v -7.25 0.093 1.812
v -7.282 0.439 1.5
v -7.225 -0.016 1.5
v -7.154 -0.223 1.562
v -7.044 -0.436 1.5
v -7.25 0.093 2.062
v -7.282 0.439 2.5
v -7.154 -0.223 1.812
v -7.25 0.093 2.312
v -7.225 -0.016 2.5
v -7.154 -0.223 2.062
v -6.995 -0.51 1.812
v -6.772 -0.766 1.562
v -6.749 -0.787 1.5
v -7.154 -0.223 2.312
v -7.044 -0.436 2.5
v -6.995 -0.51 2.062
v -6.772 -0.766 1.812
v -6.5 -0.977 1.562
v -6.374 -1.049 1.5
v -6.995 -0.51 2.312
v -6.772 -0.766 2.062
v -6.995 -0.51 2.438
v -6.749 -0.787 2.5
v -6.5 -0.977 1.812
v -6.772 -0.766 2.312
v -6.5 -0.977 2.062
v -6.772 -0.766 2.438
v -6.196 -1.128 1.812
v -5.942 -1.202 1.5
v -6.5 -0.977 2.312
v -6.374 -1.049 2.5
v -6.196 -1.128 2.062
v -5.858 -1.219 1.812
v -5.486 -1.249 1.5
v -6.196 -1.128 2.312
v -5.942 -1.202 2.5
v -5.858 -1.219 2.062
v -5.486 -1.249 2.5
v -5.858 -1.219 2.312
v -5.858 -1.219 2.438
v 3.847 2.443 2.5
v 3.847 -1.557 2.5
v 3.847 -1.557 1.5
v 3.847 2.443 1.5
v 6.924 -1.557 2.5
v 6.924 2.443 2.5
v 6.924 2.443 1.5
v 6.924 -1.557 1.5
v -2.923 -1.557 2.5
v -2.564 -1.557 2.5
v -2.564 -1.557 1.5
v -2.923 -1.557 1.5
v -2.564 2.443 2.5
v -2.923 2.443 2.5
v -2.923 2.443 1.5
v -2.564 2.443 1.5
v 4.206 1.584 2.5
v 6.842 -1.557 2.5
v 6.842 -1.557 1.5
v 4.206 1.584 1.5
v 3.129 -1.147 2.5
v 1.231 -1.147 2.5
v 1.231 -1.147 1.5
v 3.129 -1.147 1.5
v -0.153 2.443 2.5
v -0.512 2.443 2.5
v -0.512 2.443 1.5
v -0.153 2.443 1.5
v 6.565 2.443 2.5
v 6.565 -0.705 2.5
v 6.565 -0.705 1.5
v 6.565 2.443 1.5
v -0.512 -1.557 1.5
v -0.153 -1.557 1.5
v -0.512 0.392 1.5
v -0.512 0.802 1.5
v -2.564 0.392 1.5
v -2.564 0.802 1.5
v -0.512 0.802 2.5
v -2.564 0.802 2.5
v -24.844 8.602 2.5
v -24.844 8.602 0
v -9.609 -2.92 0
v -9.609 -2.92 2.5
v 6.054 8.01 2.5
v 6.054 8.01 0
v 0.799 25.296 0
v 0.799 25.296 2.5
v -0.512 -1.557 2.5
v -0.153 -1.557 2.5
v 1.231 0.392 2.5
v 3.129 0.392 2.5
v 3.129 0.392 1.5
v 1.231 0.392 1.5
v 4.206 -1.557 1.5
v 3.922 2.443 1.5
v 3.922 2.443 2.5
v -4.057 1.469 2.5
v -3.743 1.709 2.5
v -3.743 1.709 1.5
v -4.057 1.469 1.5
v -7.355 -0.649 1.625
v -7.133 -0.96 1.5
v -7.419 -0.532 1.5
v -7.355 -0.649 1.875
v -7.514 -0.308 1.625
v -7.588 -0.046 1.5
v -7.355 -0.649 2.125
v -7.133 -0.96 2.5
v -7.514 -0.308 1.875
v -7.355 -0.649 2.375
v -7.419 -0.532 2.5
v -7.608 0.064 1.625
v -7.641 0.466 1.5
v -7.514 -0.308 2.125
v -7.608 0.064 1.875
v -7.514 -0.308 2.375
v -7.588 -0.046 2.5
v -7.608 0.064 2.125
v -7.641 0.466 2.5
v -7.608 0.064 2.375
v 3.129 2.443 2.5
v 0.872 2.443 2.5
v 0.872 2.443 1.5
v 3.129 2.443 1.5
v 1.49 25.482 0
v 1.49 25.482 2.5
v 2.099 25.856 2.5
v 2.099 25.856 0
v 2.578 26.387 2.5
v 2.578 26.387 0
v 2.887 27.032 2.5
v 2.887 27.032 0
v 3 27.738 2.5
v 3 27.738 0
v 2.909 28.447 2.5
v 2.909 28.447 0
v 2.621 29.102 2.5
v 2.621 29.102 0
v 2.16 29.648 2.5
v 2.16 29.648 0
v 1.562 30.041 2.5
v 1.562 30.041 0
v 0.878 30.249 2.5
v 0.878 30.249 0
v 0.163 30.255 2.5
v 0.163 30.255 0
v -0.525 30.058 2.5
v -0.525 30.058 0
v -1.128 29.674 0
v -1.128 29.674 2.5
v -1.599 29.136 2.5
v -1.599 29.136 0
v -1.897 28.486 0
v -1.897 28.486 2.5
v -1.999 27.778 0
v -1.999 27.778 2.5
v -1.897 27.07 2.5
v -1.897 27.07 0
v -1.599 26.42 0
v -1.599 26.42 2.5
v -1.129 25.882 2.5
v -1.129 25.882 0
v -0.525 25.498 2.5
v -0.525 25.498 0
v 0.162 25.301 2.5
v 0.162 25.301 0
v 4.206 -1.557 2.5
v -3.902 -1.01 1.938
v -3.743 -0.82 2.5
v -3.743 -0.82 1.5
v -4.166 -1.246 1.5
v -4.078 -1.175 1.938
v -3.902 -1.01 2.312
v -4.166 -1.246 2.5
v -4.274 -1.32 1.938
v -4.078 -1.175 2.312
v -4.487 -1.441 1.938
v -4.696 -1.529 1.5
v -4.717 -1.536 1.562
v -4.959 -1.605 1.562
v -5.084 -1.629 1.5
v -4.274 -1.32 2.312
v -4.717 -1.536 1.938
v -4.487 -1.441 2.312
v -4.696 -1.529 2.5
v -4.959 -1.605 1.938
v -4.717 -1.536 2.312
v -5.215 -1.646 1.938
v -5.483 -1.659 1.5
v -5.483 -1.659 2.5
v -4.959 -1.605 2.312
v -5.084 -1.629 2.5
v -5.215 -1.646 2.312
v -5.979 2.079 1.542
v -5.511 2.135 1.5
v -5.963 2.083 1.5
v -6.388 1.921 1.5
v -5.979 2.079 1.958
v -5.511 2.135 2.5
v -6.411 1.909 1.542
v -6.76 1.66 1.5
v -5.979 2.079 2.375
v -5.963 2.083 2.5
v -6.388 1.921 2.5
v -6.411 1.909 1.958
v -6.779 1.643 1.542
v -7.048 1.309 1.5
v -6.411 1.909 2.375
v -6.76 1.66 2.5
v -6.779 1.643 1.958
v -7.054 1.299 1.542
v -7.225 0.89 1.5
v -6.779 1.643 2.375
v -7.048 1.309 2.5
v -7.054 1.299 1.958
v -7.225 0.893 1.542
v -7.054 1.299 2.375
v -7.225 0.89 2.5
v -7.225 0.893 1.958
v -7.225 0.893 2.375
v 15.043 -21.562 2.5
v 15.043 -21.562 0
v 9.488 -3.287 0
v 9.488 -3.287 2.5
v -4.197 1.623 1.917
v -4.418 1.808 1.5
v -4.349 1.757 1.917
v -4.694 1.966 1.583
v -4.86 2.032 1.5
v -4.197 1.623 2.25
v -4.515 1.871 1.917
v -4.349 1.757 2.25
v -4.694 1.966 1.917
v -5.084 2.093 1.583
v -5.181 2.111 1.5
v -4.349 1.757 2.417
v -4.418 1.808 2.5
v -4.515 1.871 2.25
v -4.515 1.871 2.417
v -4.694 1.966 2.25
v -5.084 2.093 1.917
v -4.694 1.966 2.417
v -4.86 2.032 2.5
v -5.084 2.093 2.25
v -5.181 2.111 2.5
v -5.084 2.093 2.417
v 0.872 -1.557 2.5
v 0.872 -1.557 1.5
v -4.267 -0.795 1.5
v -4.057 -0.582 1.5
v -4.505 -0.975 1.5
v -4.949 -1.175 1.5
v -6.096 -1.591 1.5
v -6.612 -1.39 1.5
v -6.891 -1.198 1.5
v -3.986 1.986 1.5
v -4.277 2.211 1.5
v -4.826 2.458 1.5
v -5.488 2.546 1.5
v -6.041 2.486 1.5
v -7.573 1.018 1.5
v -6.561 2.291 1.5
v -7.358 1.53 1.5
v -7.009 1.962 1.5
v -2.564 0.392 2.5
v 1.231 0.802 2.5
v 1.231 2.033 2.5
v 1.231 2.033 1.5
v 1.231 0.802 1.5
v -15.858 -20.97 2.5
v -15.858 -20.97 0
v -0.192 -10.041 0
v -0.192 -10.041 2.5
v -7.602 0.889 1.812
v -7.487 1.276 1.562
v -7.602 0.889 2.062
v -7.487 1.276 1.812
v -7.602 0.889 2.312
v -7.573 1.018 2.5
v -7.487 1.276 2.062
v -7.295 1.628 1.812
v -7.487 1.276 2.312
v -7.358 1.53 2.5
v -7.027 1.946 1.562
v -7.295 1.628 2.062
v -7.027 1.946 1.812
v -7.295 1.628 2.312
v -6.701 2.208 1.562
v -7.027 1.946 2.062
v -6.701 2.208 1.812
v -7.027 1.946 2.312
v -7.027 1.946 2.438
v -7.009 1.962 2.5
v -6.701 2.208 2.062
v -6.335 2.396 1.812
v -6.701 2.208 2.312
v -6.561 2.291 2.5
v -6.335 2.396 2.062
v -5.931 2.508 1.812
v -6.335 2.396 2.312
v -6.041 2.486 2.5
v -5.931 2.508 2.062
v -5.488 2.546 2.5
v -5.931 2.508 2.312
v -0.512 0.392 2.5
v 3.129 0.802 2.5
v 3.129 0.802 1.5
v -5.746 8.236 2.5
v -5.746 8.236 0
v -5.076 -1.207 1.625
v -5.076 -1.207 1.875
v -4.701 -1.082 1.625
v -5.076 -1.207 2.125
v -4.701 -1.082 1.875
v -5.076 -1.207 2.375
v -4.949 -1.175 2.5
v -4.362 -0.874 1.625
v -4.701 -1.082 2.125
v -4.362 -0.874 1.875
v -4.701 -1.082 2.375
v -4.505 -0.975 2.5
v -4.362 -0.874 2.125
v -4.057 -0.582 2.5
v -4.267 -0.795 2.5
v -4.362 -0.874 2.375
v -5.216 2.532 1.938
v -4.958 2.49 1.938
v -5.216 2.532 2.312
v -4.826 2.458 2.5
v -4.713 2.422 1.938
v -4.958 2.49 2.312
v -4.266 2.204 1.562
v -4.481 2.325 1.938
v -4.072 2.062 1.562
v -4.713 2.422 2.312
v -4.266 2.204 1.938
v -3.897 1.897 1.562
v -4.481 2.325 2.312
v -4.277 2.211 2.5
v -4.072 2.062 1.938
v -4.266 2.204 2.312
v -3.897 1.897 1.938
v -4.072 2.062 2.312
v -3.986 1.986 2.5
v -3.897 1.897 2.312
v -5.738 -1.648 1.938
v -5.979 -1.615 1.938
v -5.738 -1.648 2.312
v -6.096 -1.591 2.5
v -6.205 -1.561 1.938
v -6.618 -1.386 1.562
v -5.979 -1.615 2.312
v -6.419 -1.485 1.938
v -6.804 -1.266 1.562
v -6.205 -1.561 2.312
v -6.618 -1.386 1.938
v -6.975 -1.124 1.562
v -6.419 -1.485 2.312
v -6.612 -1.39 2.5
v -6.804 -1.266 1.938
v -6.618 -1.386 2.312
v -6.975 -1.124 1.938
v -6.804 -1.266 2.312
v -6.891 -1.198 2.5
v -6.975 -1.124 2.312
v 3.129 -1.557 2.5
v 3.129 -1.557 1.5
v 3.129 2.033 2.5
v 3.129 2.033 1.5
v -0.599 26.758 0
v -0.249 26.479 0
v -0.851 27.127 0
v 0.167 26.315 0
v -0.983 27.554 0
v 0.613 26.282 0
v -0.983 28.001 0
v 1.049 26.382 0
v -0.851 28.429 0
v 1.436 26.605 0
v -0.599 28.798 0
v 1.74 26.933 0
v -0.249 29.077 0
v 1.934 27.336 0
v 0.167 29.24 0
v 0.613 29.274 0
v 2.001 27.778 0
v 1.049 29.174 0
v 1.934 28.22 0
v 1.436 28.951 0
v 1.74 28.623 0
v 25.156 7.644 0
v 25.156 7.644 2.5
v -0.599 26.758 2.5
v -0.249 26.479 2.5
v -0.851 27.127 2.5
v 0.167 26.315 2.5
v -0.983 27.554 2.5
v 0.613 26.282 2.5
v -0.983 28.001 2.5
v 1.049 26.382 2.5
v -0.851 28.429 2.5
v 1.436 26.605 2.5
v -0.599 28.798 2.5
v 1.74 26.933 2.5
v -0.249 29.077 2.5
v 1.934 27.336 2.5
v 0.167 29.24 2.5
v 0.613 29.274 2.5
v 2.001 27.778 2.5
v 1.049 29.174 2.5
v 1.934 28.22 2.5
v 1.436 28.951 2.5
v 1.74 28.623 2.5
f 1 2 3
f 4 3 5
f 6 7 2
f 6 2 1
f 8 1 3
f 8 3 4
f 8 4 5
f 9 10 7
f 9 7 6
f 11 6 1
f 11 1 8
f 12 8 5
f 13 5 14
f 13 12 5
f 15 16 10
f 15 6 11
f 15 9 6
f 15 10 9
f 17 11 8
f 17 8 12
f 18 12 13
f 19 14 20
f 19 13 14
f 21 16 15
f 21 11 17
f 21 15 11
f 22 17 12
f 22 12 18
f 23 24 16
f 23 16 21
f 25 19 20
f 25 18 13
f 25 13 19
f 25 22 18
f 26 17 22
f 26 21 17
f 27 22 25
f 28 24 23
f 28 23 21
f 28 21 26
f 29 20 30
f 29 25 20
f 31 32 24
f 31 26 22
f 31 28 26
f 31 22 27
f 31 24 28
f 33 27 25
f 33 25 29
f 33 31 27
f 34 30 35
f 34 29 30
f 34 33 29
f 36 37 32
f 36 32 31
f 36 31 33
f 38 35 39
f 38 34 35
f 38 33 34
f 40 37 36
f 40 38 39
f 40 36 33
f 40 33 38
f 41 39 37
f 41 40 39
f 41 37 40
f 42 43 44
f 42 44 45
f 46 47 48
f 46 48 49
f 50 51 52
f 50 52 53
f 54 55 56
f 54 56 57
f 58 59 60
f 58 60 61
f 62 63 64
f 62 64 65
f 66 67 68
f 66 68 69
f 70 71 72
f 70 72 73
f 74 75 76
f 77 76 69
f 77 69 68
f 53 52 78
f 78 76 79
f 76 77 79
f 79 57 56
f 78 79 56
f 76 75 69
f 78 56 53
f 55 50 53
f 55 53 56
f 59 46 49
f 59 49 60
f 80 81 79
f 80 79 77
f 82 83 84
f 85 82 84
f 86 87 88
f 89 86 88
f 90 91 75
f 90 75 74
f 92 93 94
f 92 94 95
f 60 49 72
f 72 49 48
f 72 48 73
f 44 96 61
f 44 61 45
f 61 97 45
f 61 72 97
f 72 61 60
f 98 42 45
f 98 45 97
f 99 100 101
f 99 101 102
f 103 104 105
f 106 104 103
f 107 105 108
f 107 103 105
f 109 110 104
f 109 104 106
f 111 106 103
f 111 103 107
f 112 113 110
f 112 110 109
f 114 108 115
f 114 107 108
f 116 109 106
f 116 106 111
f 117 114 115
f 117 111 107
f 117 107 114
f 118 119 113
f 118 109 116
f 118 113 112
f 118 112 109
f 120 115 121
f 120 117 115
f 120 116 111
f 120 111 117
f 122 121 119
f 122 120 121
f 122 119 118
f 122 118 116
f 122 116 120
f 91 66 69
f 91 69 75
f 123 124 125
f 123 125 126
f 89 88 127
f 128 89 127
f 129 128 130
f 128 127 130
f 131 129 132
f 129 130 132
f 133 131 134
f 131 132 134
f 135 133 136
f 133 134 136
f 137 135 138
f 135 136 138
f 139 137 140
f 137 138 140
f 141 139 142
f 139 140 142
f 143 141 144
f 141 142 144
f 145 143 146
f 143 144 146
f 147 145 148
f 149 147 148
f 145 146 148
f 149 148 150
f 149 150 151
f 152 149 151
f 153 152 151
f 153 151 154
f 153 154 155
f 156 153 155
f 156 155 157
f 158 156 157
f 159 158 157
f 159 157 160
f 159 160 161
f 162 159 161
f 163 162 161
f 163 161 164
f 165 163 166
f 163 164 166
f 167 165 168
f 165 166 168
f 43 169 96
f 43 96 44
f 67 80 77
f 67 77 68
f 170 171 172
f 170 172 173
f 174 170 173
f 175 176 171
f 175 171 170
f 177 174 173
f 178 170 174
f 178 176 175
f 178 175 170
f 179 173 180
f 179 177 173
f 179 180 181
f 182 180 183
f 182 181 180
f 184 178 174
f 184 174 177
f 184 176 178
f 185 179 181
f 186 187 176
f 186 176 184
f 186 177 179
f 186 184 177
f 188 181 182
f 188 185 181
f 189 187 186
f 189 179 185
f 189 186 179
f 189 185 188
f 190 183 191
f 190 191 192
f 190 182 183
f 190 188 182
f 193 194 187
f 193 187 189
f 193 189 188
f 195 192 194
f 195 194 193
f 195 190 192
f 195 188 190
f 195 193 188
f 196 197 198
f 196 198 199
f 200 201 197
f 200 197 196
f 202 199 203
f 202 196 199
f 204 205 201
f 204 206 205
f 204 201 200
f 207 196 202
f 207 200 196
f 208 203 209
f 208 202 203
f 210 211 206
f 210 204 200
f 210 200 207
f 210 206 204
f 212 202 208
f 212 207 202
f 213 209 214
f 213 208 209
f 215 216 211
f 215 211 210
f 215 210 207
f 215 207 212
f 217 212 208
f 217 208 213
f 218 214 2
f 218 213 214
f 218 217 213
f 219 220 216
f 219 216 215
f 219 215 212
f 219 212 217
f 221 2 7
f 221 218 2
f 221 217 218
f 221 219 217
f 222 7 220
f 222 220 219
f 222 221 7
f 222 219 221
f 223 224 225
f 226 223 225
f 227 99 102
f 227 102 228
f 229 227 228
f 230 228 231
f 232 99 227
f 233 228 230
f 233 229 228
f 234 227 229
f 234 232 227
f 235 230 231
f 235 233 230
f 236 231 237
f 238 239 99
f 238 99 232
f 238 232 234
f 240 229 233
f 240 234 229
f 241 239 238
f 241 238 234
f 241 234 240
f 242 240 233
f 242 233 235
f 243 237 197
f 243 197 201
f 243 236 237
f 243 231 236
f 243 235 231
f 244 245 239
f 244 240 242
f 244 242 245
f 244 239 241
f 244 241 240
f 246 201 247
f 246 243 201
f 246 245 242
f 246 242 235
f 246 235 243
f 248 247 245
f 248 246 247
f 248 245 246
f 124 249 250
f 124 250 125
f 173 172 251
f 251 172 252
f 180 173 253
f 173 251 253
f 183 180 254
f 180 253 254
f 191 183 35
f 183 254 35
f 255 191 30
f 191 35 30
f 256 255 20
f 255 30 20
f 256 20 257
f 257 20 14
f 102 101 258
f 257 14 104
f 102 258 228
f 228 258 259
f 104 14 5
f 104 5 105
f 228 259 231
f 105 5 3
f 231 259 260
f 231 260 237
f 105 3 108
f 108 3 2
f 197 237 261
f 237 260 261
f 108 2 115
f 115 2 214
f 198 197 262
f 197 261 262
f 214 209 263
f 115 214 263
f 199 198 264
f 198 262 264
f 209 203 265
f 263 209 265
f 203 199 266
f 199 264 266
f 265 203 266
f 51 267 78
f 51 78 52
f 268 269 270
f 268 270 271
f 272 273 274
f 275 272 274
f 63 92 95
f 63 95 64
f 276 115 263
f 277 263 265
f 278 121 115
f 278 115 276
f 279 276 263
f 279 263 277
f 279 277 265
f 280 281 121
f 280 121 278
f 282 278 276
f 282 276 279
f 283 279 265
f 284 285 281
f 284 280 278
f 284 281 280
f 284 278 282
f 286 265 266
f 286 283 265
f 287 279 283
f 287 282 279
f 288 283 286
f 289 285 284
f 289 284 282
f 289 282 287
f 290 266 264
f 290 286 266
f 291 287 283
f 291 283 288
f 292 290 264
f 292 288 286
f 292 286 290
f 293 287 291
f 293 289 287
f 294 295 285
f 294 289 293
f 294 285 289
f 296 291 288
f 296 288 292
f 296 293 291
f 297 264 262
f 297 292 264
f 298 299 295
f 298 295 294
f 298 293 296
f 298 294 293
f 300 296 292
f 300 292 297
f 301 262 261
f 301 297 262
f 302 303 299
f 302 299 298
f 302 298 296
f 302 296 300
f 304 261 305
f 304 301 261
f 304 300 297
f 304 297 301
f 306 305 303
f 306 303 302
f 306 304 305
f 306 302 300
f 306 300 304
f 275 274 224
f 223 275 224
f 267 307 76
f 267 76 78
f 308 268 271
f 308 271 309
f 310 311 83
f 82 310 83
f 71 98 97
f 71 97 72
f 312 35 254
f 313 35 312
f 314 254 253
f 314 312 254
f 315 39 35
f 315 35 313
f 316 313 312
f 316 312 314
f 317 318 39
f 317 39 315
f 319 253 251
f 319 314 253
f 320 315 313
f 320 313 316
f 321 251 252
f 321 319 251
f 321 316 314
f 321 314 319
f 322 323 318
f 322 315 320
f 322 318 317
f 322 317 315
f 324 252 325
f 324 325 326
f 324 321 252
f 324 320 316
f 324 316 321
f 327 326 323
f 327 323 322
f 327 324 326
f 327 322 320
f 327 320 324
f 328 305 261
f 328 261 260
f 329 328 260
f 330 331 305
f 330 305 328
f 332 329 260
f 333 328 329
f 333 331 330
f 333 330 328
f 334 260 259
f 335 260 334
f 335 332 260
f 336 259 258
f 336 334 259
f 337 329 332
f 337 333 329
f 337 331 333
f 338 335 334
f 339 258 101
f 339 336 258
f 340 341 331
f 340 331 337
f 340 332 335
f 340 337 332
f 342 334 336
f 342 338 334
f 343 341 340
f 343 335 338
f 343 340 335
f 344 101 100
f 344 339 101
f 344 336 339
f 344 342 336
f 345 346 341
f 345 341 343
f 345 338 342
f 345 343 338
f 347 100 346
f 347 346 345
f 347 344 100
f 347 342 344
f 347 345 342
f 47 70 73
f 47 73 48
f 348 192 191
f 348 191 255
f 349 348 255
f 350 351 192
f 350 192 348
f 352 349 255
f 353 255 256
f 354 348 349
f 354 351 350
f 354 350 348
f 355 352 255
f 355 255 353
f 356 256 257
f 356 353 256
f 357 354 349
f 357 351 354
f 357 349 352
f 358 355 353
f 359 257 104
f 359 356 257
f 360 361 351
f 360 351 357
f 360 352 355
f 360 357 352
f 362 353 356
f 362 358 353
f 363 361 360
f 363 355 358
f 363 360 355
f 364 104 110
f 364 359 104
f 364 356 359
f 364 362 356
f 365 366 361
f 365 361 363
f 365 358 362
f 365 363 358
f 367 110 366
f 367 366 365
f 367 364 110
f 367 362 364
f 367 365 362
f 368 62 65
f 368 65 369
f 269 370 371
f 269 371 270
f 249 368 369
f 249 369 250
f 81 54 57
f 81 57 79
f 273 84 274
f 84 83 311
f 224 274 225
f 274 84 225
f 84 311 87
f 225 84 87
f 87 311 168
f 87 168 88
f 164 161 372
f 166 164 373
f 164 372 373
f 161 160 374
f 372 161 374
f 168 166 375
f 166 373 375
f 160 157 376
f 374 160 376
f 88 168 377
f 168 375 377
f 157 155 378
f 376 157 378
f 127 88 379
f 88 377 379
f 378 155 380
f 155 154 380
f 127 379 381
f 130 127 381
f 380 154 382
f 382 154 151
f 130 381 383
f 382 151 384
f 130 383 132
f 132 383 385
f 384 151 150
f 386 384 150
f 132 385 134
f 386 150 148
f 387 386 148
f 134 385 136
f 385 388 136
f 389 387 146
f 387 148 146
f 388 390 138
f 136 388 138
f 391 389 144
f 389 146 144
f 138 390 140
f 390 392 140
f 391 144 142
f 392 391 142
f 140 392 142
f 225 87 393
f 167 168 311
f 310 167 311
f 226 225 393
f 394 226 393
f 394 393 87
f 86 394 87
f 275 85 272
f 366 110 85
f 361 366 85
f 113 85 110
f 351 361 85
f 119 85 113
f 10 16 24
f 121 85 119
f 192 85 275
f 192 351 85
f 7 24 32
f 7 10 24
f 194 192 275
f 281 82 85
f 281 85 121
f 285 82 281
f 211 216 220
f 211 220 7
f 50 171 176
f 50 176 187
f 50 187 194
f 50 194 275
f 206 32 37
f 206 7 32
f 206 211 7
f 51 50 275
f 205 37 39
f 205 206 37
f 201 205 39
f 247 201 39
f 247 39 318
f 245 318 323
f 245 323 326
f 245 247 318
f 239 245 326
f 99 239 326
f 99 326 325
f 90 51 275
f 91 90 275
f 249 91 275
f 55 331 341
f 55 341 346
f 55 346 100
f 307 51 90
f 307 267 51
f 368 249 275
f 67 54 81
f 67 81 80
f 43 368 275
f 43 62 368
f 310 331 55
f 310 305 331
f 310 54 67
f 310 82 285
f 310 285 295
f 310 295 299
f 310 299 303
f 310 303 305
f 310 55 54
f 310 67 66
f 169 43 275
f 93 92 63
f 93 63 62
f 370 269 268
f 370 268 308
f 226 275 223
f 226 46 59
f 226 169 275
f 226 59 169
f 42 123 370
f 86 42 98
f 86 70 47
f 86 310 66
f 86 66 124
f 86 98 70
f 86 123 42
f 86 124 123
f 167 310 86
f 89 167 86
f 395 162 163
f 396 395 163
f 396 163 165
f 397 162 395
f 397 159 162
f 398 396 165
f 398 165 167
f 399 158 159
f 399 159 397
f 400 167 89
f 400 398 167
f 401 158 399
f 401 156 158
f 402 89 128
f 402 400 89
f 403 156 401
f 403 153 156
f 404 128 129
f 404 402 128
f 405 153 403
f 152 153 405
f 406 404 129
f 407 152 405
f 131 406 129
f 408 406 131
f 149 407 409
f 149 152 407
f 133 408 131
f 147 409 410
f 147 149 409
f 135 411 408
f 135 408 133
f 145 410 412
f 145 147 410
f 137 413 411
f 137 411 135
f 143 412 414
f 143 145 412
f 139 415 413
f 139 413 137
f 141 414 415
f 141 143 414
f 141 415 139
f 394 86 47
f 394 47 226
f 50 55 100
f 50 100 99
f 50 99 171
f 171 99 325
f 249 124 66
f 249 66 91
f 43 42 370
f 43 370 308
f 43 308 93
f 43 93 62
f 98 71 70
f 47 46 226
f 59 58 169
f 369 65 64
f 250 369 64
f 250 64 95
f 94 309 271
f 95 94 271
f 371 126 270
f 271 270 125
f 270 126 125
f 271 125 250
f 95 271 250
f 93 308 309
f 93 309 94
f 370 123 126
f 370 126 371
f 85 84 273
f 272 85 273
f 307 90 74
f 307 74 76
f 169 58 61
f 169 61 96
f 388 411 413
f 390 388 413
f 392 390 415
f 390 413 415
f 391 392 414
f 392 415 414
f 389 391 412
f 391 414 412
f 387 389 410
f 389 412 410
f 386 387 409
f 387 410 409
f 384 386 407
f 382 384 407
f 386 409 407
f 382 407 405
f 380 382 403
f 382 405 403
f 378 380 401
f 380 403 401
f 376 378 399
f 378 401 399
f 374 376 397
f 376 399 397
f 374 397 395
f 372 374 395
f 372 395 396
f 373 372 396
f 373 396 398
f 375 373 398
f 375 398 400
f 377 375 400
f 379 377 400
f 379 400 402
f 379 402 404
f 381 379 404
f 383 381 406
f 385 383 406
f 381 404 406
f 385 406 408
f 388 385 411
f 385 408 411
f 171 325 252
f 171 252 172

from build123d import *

# Parameters (mm, degrees)
EXTRUDE_1_DEPTH     = 2.5
CUT_EXTRUDE_1_DEPTH = 1
SKETCH_4_R          = 1.5
CUT_EXTRUDE_3_DEPTH = 2.5


with BuildPart() as part:
    # 草图1 → 凸台-拉伸1 (new body)
    with BuildSketch(Plane.XY):
        with BuildLine():
            Line((-24.844384519, 8.60192761), (-9.608590106, -2.919770039))
            Line((-9.608590106, -2.919770039), (-15.858256337, -20.970271974))
            Line((-15.858256337, -20.970271974), (-0.192351313, -10.040570794))
            Line((-0.192351313, -10.040570794), (15.0434431, -21.562268443))
            Line((15.0434431, -21.562268443), (9.487934055, -3.286883328))
            Line((9.487934055, -3.286883328), (25.155615481, 7.644057202))
            Line((25.155615481, 7.644057202), (6.053810642, 8.009998274))
            Line((6.053810642, 8.009998274), (0.799130777, 25.295776665))
            ThreePointArc((0.799130777, 25.295776665), (0.520604646, 30.277806022), (0.162308714, 25.300877517))
            Line((0.162308714, 25.300877517), (-5.746083956, 8.236053671))
            Line((-5.746083956, 8.236053671), (-24.844384519, 8.60192761))
        make_face()
    extrude(amount=EXTRUDE_1_DEPTH)

    # 草图2 → 切除-拉伸1 (cut)
    with BuildSketch(Plane.XY.offset(2.5)):
        with BuildLine():
            Line((-3.743094252, 1.70920022), (-4.057196816, 1.468815604))
            add(Edge.make_bspline(
                [(-4.057196816, 1.468815604), (-4.079603546, 1.49551957), (-4.124114914, 1.548567474), (-4.195725431, 1.623058382), (-4.27035588, 1.692847252), (-4.347977733, 1.758266543), (-4.429988155, 1.817028561), (-4.514400496, 1.872195536), (-4.602626834, 1.921644379), (-4.724628816, 1.981602077), (-4.884226357, 2.044169112), (-5.085134745, 2.096629947), (-5.294861714, 2.130025577), (-5.437944685, 2.133642538), (-5.510722457, 2.135482271)],
                knots=[0, 0, 0, 0, 0.757959112, 1.505699292, 2.245454638, 2.979532153, 3.711538275, 4.438200793, 5.171680507, 5.909471876, 7.393775596, 8.890124382, 10.418191784, 12, 12, 12, 12], degree=3))
            add(Edge.make_bspline(
                [(-5.510722457, 2.135482271), (-5.550817657, 2.1350206), (-5.630635934, 2.134101541), (-5.749091332, 2.121976827), (-5.865334819, 2.104935444), (-5.979290781, 2.07964936), (-6.090814162, 2.047680653), (-6.20063405, 2.00948018), (-6.30716045, 1.962217506), (-6.411867008, 1.909979494), (-6.512186106, 1.8509767), (-6.60710616, 1.786618584), (-6.696280981, 1.717625331), (-6.779781109, 1.643738352), (-6.857691907, 1.565290397), (-6.929448834, 1.481445435), (-6.994803588, 1.392471523), (-7.055051617, 1.299541914), (-7.109009027, 1.202927295), (-7.154186032, 1.102270072), (-7.194191886, 0.999293954), (-7.225848163, 0.892835485), (-7.250904753, 0.783643752), (-7.268193512, 0.671425709), (-7.280180336, 0.556415789), (-7.281094824, 0.478462289), (-7.281555791, 0.439168169)],
                knots=[0, 0, 0, 0, 1.054917814, 2.100044995, 3.131103042, 4.146048494, 5.169673617, 6.183595914, 7.203665975, 8.234915748, 9.262203917, 10.264457458, 11.251630812, 12.227803204, 13.197192746, 14.159520551, 15.12972552, 16.100847026, 17.073214652, 18.039054194, 19.002613845, 19.979014051, 20.95965708, 21.949030935, 22.966165397, 24, 24, 24, 24], degree=3))
            add(Edge.make_bspline(
                [(-7.281555791, 0.439168169), (-7.280113712, 0.38004666), (-7.277282381, 0.26396942), (-7.252084285, 0.093945865), (-7.213792752, -0.068934905), (-7.156403521, -0.223654725), (-7.085638892, -0.372121419), (-6.996221051, -0.511822966), (-6.892659294, -0.644870468), (-6.773488528, -0.768119552), (-6.642739024, -0.880706666), (-6.502455697, -0.979850188), (-6.352987939, -1.062495768), (-6.195986076, -1.131268278), (-6.030241946, -1.18413311), (-5.856053601, -1.221349251), (-5.673799892, -1.245626029), (-5.549263435, -1.247950244), (-5.485882714, -1.249133114)],
                knots=[0, 0, 0, 0, 1.029171465, 2.020641659, 2.987623507, 3.938342917, 4.889210282, 5.84687017, 6.821220943, 7.821438502, 8.827599549, 9.822697543, 10.807740252, 11.797342354, 12.80366471, 13.83203677, 14.896651826, 16, 16, 16, 16], degree=3))
            add(Edge.make_bspline(
                [(-5.485882714, -1.249133114), (-5.416051069, -1.24720308), (-5.278605688, -1.243404311), (-5.077042229, -1.211222312), (-4.884087068, -1.159041834), (-4.699729826, -1.086015637), (-4.524490231, -0.99108388), (-4.358094048, -0.876000591), (-4.200400824, -0.739671068), (-4.105576502, -0.635576065), (-4.057196816, -0.582466447)],
                knots=[0, 0, 0, 0, 1.028121516, 2.023589091, 2.998037872, 3.967518031, 4.937445131, 5.927275754, 6.942489185, 8, 8, 8, 8], degree=3))
            Line((-4.057196816, -0.582466447), (-3.743094252, -0.820447216))
            add(Edge.make_bspline(
                [(-3.743094252, -0.820447216), (-3.768372092, -0.85306259), (-3.818806692, -0.918137111), (-3.900472998, -1.009876208), (-3.986504195, -1.096166534), (-4.077539292, -1.176312387), (-4.172531054, -1.251917491), (-4.273185125, -1.320833869), (-4.378178305, -1.384023451), (-4.487154852, -1.441882794), (-4.599998981, -1.49321679), (-4.716575478, -1.537163953), (-4.83638185, -1.57502097), (-4.959423574, -1.606166041), (-5.085955868, -1.630475851), (-5.215522124, -1.646726908), (-5.348401981, -1.657860524), (-5.438049319, -1.658875285), (-5.483478868, -1.659389524)],
                knots=[0, 0, 0, 0, 0.986787822, 1.968848986, 2.935600012, 3.899624008, 4.868462664, 5.837806735, 6.815139263, 7.798259679, 8.787526145, 9.778297419, 10.776456485, 11.791383307, 12.812564526, 13.85620153, 14.913611965, 16, 16, 16, 16], degree=3))
            add(Edge.make_bspline(
                [(-5.483478868, -1.659389524), (-5.526500201, -1.659090104), (-5.611569562, -1.658498038), (-5.737168135, -1.648906989), (-5.859441941, -1.635821576), (-5.978041514, -1.616118569), (-6.093614057, -1.592867894), (-6.205111868, -1.561700744), (-6.313632108, -1.526787411), (-6.418738783, -1.48575314), (-6.520521297, -1.439448931), (-6.618651367, -1.387115721), (-6.713083861, -1.32919359), (-6.8047472, -1.266959293), (-6.892287295, -1.198413805), (-6.976462753, -1.12450908), (-7.057745583, -1.04549421), (-7.108034366, -0.988517235), (-7.133318611, -0.959870293)],
                knots=[0, 0, 0, 0, 1.114604814, 2.203992996, 3.262667896, 4.300477797, 5.318619304, 6.316056647, 7.298880507, 8.271930387, 9.238335007, 10.195173496, 11.151986948, 12.108099108, 13.064862484, 14.031167946, 15.010108607, 16, 16, 16, 16], degree=3))
            add(Edge.make_bspline(
                [(-7.133318611, -0.959870293), (-7.17381649, -0.910108934), (-7.25432332, -0.81118698), (-7.357324101, -0.650860144), (-7.445492736, -0.483467905), (-7.516779503, -0.308130844), (-7.57250834, -0.125242401), (-7.61111542, 0.065289615), (-7.636202968, 0.263287264), (-7.63907187, 0.397957879), (-7.64053015, 0.466411758)],
                knots=[0, 0, 0, 0, 0.994628077, 1.977248131, 2.950237994, 3.925870899, 4.908910175, 5.911660606, 6.938484602, 8, 8, 8, 8], degree=3))
            add(Edge.make_bspline(
                [(-7.64053015, 0.466411758), (-7.638752786, 0.538360848), (-7.635255933, 0.67991619), (-7.605546452, 0.887657851), (-7.557753542, 1.086688021), (-7.489871384, 1.276635158), (-7.403808125, 1.458498335), (-7.297491995, 1.630888284), (-7.172158118, 1.794907483), (-7.02878947, 1.948067199), (-6.871569658, 2.088112174), (-6.703205299, 2.211319264), (-6.524025931, 2.313853568), (-6.336005529, 2.399563468), (-6.137736179, 2.465442854), (-5.9296409, 2.511560782), (-5.712110712, 2.540266057), (-5.563696511, 2.543894866), (-5.48828656, 2.545738681)],
                knots=[0, 0, 0, 0, 1.032925535, 2.032216505, 3.007276963, 3.968222605, 4.92396291, 5.891752235, 6.871517503, 7.883894988, 8.900124299, 9.891468569, 10.874487609, 11.85992873, 12.854644235, 13.869047385, 14.917252991, 16, 16, 16, 16], degree=3))
            add(Edge.make_bspline(
                [(-5.48828656, 2.545738681), (-5.442327163, 2.545187666), (-5.351355167, 2.544096987), (-5.216780707, 2.533461396), (-5.085760904, 2.515731561), (-4.958205496, 2.49159891), (-4.833493935, 2.461647685), (-4.712579374, 2.422630201), (-4.594752303, 2.378017023), (-4.480755837, 2.326635919), (-4.371136922, 2.268959643), (-4.265929701, 2.205627502), (-4.165969863, 2.13671801), (-4.070554036, 2.062817238), (-3.981278366, 1.982361741), (-3.895608105, 1.897564489), (-3.816452587, 1.805982975), (-3.767591793, 1.741520194), (-3.743094252, 1.70920022)],
                knots=[0, 0, 0, 0, 1.096760587, 2.17092713, 3.219439832, 4.250915756, 5.268269357, 6.278326846, 7.281116186, 8.274029601, 9.260640565, 10.235837813, 11.203064059, 12.156899882, 13.114053108, 14.069676657, 15.032185724, 16, 16, 16, 16], degree=3))
        make_face()
        Polygon((-2.922581432, 2.443174579), (-2.563607073, 2.443174579), (-2.563607073, 0.802148938), (-0.512325021, 0.802148938), (-0.512325021, 2.443174579), (-0.153350663, 2.443174579), (-0.153350663, -1.556825421), (-0.512325021, -1.556825421), (-0.512325021, 0.391892527), (-2.563607073, 0.391892527), (-2.563607073, -1.556825421), (-2.922581432, -1.556825421), align=None)
        Polygon((0.872290363, 2.443174579), (3.12870062, 2.443174579), (3.12870062, 2.032918169), (1.231264722, 2.032918169), (1.231264722, 0.802148938), (3.12870062, 0.802148938), (3.12870062, 0.391892527), (1.231264722, 0.391892527), (1.231264722, -1.146569011), (3.12870062, -1.146569011), (3.12870062, -1.556825421), (0.872290363, -1.556825421), align=None)
        Polygon((3.846649337, -1.556825421), (3.846649337, 2.443174579), (3.92196985, 2.443174579), (6.564598055, -0.705062601), (6.564598055, 2.443174579), (6.923572414, 2.443174579), (6.923572414, -1.556825421), (6.841841645, -1.556825421), (4.205623696, 1.58420022), (4.205623696, -1.556825421), align=None)
    extrude(amount=-CUT_EXTRUDE_1_DEPTH, mode=Mode.SUBTRACT)

    # 草图4 → 切除-拉伸3 (cut)
    with BuildSketch(Plane.XY.offset(2.5)):
        with Locations((0.500580653, 27.777886216)):
            Circle(SKETCH_4_R)
    extrude(amount=-CUT_EXTRUDE_3_DEPTH, mode=Mode.SUBTRACT)


solid = part.part
